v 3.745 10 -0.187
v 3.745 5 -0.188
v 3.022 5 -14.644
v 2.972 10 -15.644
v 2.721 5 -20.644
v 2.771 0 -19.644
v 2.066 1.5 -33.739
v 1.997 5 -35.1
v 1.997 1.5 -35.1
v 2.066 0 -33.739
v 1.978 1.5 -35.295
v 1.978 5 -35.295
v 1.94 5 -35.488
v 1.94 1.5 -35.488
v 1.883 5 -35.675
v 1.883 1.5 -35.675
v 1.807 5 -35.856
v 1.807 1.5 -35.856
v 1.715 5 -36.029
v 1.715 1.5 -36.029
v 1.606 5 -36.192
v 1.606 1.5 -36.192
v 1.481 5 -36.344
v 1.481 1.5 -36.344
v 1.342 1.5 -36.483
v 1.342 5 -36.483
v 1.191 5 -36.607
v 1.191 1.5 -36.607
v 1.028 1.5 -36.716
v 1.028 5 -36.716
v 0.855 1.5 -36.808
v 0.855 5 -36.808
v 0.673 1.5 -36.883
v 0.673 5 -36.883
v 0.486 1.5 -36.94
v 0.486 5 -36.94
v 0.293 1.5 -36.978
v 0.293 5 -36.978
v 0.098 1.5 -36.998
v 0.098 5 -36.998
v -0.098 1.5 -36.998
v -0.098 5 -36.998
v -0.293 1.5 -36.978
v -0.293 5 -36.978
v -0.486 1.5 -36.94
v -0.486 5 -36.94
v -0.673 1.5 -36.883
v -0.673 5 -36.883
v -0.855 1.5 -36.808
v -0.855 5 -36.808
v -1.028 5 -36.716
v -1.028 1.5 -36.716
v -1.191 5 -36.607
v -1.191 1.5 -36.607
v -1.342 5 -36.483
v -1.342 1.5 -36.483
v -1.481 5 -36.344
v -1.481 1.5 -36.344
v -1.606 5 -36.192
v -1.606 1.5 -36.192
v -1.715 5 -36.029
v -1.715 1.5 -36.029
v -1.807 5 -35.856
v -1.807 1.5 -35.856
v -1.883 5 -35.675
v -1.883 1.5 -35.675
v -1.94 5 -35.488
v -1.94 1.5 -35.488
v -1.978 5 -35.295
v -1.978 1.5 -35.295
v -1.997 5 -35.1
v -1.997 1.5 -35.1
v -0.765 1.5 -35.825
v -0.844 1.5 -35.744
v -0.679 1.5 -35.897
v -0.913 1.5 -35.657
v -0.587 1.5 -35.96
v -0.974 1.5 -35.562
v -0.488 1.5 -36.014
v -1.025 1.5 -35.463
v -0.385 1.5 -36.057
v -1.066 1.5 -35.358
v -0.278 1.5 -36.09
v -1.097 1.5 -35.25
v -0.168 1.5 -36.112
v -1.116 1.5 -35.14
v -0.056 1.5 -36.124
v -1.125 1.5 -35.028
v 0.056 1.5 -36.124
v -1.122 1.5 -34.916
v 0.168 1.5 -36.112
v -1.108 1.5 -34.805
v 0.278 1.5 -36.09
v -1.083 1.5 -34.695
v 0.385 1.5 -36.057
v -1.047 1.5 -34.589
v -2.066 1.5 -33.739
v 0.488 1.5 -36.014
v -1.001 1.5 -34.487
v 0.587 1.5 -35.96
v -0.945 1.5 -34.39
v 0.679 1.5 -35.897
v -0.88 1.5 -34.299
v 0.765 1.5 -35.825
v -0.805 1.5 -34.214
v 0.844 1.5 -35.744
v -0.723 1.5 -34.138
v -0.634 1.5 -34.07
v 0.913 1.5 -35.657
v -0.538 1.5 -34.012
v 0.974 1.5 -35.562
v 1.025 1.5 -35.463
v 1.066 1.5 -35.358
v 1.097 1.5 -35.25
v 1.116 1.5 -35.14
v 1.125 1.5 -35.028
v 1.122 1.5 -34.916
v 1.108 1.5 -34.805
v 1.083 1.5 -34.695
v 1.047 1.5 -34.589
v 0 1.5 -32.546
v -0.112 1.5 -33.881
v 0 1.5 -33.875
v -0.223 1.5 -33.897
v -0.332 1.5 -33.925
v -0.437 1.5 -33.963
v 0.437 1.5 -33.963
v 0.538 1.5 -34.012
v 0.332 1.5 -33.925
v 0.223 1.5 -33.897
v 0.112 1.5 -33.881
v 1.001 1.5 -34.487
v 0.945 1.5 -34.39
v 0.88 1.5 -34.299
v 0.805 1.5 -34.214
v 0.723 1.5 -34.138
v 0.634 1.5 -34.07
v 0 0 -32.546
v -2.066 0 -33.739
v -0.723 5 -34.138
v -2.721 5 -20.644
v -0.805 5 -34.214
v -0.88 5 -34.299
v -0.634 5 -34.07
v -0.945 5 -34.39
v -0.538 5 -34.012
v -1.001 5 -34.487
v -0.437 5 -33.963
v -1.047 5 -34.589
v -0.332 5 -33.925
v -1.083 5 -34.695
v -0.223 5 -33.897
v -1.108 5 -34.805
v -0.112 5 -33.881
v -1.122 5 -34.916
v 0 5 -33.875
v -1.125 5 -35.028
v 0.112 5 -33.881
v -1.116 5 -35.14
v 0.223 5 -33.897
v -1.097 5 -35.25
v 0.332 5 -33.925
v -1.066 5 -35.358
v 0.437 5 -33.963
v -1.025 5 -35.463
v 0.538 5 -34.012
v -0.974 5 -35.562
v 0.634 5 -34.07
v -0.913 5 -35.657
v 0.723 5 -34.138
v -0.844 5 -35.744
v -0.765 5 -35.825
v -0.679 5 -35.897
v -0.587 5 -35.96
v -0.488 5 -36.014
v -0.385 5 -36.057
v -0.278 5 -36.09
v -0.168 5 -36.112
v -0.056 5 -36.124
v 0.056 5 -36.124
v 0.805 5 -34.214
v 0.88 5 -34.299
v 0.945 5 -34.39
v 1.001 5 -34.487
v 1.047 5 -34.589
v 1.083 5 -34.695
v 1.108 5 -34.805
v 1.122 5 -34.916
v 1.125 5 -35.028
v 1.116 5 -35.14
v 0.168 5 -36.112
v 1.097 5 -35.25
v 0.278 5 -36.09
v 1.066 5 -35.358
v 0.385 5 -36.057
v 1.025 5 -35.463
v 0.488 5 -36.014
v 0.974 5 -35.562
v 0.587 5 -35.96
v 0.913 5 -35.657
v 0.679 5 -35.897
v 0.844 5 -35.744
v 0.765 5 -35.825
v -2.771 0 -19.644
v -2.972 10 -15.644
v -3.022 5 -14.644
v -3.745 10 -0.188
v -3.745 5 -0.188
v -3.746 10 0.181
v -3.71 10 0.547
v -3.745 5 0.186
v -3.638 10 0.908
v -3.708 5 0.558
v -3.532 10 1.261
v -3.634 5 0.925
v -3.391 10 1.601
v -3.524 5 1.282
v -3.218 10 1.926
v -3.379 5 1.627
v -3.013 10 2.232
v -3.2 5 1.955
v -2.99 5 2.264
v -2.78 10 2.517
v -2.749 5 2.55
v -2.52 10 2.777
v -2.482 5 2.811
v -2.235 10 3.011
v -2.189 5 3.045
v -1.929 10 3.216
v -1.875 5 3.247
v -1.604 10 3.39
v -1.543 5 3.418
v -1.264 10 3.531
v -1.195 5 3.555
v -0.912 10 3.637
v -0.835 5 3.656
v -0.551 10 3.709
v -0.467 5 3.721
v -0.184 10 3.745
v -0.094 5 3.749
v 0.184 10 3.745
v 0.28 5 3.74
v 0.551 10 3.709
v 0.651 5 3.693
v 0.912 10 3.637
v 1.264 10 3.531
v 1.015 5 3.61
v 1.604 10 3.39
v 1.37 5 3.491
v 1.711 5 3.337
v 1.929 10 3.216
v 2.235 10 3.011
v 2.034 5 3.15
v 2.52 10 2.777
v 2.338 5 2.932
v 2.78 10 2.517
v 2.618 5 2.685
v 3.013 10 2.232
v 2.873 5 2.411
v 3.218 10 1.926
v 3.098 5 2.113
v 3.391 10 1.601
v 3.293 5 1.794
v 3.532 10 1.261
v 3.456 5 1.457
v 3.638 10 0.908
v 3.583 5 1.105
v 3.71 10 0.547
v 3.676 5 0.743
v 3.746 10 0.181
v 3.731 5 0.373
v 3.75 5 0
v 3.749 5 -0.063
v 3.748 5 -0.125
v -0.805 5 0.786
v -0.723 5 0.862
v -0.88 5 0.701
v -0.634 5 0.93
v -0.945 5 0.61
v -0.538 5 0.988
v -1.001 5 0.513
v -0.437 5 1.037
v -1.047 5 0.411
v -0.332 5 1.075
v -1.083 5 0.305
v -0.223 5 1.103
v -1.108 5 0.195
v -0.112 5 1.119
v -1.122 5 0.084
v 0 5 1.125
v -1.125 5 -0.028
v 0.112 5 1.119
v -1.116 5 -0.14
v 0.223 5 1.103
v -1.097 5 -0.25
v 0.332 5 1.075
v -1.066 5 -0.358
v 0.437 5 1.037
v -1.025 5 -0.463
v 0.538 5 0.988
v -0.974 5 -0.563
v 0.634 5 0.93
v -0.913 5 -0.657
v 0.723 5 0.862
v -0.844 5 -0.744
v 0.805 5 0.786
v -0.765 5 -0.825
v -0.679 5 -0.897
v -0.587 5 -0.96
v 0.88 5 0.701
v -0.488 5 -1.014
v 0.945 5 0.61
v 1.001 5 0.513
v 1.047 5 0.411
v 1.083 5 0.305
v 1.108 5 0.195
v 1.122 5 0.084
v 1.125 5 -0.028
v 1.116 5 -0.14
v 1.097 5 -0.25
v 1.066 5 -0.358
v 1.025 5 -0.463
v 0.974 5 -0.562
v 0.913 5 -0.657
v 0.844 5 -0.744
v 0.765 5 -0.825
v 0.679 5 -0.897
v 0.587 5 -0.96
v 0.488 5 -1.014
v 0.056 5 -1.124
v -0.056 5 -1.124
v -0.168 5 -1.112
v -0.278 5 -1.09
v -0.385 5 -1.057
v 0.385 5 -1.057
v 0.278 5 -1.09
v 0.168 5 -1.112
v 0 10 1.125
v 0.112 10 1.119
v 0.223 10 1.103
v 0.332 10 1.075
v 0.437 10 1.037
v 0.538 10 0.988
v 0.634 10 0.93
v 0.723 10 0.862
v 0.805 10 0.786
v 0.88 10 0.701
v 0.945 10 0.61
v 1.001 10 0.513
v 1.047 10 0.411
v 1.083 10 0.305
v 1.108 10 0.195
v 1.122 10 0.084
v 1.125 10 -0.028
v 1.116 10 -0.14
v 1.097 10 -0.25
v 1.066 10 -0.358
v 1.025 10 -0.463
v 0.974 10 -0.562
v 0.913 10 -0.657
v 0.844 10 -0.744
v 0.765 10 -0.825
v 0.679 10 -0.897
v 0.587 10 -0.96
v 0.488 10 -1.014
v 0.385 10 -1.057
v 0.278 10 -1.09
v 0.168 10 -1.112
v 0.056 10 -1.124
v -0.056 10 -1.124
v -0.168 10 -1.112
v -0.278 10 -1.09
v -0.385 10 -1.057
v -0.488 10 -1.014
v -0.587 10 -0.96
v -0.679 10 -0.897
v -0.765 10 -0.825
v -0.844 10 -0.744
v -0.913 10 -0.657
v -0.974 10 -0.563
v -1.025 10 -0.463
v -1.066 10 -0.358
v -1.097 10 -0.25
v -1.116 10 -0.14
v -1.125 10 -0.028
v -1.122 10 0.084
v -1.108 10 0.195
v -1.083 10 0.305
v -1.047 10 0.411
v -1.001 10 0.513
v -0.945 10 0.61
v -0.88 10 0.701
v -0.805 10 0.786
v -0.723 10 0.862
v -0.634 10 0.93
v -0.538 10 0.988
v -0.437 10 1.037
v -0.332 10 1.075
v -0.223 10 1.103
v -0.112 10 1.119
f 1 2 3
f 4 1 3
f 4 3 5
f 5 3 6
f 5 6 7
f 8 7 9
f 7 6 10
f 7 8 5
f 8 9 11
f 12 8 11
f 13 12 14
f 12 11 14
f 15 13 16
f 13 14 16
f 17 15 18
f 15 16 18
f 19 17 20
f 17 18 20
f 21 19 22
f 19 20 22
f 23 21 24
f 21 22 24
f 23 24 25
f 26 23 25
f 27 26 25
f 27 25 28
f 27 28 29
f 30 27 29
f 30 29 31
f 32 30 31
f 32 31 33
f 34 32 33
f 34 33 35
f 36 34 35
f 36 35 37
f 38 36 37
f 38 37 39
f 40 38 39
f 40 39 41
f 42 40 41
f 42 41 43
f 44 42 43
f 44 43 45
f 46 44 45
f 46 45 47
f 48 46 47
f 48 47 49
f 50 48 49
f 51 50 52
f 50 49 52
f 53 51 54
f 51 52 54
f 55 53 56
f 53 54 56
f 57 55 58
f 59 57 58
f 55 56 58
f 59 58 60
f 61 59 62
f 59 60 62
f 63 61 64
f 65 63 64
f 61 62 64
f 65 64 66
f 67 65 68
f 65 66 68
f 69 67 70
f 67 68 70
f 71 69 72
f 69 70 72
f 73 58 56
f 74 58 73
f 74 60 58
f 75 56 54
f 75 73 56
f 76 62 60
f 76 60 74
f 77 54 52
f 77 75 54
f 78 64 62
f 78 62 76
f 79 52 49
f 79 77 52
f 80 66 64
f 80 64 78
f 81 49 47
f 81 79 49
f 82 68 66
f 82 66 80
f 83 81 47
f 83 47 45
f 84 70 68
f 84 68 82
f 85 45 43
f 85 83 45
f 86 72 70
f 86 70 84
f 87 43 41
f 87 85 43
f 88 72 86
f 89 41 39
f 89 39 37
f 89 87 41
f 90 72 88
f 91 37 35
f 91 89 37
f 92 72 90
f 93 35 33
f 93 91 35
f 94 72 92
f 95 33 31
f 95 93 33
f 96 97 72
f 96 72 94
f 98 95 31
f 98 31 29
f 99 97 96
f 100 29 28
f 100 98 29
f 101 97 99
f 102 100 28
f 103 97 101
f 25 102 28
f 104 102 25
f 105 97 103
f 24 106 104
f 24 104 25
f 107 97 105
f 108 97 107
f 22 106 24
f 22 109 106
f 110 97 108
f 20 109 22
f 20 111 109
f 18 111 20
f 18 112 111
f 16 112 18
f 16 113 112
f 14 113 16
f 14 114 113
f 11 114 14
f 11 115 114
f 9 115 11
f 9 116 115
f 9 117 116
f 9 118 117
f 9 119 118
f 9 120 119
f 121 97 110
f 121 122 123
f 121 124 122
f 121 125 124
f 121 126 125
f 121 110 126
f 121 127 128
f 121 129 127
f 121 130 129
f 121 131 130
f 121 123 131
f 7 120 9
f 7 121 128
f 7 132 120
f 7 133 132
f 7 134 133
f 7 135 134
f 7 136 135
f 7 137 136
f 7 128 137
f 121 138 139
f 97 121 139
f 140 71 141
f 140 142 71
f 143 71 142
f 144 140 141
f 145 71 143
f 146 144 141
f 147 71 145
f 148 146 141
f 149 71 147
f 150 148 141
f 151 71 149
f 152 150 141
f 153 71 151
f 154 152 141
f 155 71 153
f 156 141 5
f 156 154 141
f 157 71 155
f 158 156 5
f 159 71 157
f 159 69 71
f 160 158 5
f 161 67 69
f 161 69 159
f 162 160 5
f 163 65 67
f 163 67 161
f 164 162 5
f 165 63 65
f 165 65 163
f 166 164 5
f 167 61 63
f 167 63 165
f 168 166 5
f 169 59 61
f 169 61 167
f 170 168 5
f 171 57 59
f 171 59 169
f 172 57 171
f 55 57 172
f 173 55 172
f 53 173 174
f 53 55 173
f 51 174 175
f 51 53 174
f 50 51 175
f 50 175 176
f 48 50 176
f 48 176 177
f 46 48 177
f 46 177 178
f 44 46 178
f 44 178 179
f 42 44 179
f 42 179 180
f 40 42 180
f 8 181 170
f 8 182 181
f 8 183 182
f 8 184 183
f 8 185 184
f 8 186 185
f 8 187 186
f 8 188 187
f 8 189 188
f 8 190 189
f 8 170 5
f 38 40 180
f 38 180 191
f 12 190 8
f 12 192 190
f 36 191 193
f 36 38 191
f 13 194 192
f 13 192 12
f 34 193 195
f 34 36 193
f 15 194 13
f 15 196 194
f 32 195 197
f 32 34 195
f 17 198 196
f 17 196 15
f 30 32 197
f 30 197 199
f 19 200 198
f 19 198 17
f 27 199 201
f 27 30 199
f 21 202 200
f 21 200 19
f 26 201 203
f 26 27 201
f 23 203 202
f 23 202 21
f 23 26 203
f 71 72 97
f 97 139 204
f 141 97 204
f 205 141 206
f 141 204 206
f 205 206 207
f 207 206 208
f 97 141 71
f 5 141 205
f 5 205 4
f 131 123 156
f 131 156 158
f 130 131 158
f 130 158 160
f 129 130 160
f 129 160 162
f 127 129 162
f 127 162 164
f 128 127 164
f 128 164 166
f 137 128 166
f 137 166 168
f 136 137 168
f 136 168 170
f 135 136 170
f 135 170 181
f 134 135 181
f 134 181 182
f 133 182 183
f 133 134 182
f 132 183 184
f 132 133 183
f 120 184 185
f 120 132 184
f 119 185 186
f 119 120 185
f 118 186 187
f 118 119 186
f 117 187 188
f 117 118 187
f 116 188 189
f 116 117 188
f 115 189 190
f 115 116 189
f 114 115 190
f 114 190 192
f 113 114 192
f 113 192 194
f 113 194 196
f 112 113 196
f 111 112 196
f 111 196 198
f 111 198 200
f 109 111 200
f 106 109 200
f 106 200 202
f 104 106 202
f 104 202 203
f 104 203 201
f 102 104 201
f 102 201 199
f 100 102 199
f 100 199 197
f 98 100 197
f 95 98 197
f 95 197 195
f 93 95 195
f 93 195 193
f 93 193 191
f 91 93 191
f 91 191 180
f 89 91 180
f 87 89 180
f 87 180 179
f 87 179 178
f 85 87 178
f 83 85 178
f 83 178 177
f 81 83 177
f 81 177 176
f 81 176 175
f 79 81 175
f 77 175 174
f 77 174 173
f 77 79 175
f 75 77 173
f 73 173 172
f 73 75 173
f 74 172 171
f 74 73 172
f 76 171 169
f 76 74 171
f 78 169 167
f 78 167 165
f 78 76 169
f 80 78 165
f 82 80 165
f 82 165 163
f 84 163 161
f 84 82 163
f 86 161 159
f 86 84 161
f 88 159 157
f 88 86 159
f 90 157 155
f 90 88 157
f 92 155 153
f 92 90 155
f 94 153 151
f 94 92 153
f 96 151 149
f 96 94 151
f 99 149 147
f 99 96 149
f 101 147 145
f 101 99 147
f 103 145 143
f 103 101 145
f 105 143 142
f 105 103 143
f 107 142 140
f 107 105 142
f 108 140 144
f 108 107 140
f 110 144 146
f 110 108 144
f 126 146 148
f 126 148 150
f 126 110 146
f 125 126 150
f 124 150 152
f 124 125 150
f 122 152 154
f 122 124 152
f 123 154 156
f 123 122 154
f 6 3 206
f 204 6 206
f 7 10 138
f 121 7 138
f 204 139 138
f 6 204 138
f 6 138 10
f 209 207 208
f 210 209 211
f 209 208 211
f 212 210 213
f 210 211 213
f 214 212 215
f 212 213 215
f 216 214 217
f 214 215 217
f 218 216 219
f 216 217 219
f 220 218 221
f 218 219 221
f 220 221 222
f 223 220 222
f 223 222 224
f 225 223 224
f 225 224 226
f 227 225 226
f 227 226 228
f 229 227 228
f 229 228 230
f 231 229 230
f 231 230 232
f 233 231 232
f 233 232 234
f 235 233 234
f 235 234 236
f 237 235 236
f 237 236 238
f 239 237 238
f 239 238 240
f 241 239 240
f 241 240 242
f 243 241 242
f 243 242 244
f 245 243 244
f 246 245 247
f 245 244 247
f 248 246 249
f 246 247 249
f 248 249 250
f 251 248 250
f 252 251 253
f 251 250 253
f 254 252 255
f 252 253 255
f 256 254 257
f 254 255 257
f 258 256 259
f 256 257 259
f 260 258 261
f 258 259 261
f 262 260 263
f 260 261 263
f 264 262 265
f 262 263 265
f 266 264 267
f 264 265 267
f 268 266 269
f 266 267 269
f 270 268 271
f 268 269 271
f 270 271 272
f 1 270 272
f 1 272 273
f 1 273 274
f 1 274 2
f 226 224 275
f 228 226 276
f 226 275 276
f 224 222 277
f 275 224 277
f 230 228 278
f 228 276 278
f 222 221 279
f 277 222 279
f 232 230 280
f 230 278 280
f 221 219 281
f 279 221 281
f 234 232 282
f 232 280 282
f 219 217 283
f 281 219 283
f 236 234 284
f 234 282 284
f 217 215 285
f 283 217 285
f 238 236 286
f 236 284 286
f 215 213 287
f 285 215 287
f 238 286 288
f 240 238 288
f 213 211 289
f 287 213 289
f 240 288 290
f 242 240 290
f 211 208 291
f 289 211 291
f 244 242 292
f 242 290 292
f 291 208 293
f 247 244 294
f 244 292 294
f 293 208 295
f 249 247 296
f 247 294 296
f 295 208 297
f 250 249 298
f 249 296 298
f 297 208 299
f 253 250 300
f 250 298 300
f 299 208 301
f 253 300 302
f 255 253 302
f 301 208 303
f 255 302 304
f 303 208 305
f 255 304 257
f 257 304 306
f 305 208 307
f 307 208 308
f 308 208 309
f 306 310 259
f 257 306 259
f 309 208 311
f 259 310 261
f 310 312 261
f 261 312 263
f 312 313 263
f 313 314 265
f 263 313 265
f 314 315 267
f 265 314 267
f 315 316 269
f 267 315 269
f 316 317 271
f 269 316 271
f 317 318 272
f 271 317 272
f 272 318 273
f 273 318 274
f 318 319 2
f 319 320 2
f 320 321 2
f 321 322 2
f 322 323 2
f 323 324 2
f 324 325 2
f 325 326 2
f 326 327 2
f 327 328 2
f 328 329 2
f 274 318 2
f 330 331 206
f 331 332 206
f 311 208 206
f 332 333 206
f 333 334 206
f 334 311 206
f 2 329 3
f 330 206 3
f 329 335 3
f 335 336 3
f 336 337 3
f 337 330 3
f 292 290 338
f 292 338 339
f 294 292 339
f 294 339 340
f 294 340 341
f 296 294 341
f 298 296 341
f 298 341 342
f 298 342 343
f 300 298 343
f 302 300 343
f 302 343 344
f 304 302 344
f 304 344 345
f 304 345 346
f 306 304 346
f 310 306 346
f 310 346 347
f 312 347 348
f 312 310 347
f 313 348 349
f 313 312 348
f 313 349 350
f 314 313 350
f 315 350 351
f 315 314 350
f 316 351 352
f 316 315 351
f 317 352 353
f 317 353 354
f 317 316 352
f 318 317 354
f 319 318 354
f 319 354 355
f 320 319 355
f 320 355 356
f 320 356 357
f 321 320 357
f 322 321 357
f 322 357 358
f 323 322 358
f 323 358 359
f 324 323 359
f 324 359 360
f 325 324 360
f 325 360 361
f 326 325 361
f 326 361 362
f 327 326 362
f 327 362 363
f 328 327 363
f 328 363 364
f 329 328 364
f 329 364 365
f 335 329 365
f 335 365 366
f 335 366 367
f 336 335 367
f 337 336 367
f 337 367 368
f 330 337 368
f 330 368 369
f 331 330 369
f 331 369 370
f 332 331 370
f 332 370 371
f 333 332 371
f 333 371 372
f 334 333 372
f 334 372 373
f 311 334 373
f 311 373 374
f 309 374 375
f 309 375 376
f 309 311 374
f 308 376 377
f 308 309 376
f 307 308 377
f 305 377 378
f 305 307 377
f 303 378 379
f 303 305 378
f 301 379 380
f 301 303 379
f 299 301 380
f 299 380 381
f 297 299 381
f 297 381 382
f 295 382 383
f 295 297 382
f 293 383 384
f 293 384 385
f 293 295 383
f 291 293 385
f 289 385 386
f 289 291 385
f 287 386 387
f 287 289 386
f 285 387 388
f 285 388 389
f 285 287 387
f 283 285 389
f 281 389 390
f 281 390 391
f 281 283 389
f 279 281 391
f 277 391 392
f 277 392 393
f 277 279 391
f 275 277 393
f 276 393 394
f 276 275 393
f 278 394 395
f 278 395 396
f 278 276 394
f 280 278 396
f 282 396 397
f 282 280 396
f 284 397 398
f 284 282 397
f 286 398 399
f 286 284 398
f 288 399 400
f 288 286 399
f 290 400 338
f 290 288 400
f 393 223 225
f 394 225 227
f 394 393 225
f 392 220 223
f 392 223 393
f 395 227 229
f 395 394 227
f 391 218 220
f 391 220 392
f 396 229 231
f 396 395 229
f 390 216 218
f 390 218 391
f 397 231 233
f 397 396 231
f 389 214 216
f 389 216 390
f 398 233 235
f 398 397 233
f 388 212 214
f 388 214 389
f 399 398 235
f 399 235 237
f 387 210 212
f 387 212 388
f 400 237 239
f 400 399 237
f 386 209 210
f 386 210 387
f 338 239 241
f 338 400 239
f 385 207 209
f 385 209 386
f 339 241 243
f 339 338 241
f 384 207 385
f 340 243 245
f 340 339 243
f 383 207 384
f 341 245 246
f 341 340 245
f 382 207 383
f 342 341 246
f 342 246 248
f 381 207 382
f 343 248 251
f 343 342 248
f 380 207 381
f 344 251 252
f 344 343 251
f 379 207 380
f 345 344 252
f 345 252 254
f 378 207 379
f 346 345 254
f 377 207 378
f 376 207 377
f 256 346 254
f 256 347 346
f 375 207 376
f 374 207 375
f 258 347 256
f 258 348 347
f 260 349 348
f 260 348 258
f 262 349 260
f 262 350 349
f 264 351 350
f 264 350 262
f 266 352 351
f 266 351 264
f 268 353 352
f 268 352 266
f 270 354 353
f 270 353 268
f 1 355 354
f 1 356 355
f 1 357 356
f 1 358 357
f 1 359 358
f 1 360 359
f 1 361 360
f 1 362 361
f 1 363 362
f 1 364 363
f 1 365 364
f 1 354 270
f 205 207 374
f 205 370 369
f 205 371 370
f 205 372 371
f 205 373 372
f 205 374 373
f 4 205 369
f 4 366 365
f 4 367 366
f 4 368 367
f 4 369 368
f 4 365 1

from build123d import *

# Parameters (mm, degrees)
SKETCH1_R           = 1.125
BOSS_EXTRUDE1_DEPTH = 10
CUT_EXTRUDE1_START  = -5
SKETCH2_R           = 1.125
CUT_EXTRUDE1_DEPTH  = 5
CUT_EXTRUDE3_START  = -10
SKETCH2_4_R         = 1.125
CUT_EXTRUDE3_DEPTH  = 5
CHAMFER1_SIZE       = 5
CUT_EXTRUDE4_DEPTH  = 1.5


with BuildPart() as part:
    # Sketch1 → Boss-Extrude1 (new body)
    with BuildSketch(Plane(origin=(0, 0, 0), x_dir=(1, 0, 0), z_dir=(0, 1, 0))):
        with BuildLine():
            ThreePointArc((-3.745309567, 0.1875), (0, -3.75), (3.745309567, 0.1875))
            Line((3.745309567, 0.1875), (1.997498436, 35.1))
            ThreePointArc((1.997498436, 35.1), (0, 37), (-1.997498436, 35.1))
            Line((-1.997498436, 35.1), (-3.745309567, 0.1875))
        make_face()
        with Locations(Location((0, 0, 0), (0, 0, 270))):
            Circle(SKETCH1_R, mode=Mode.SUBTRACT)
        with Locations(Location((0, 35, 0), (0, 0, 270))):
            Circle(SKETCH1_R, mode=Mode.SUBTRACT)
    extrude(amount=BOSS_EXTRUDE1_DEPTH)

    # Sketch2 → Cut-Extrude1 (cut)
    with BuildSketch(Plane(origin=(0, 10, 0), x_dir=(1, 0, 0), z_dir=(0, 1, 0)).offset(CUT_EXTRUDE1_START)):
        with BuildLine():
            Line((-1.997498436, 35.1), (-2.721216149, 20.64375))
            Line((-2.721216149, 20.64375), (2.721216149, 20.64375))
            Line((2.721216149, 20.64375), (1.997498436, 35.1))
            ThreePointArc((1.997498436, 35.1), (0, 37), (-1.997498436, 35.1))
        make_face()
        with Locations(Location((0, 35, 0), (0, 0, 270))):
            Circle(SKETCH2_R, mode=Mode.SUBTRACT)
    extrude(amount=CUT_EXTRUDE1_DEPTH, mode=Mode.SUBTRACT)

    # Sketch2<4> → Cut-Extrude3 (cut)
    # profile 1 of 2: a face of its own
    with BuildSketch(Plane(origin=(0, 10, 0), x_dir=(1, 0, 0), z_dir=(0, 1, 0)).offset(CUT_EXTRUDE3_START)):
        with BuildLine():
            ThreePointArc((3.745309567, 0.1875), (0, 3.75), (-3.745309567, 0.1875))
            ThreePointArc((-3.745309567, 0.1875), (-0.093779329, -3.748827208), (3.75, 0))
            ThreePointArc((3.75, 0), (3.748827208, 0.093779329), (3.745309567, 0.1875))
        make_face()
        with Locations(Location((0, 0, 0), (0, 0, 270))):
            Circle(SKETCH2_4_R, mode=Mode.SUBTRACT)
    # profile 2 of 2: a face of its own
    with BuildSketch(Plane(origin=(0, 10, 0), x_dir=(1, 0, 0), z_dir=(0, 1, 0)).offset(CUT_EXTRUDE3_START)):
        with BuildLine():
            Line((3.021591853, 14.64375), (-3.021591853, 14.64375))
            Line((-3.021591853, 14.64375), (-3.745309567, 0.1875))
            ThreePointArc((-3.745309567, 0.1875), (0, 3.75), (3.745309567, 0.1875))
            Line((3.745309567, 0.1875), (3.021591853, 14.64375))
        make_face()
    extrude(amount=CUT_EXTRUDE3_DEPTH, mode=Mode.SUBTRACT)

    # Chamfer1
    chamfer1_edges = [part.edges().sort_by_distance(p)[0] for p in [
        (0, 0, -14.64375),
        (0, 10, -20.64375),
    ]]
    chamfer(chamfer1_edges, length=CHAMFER1_SIZE - 0.0001)  # a hair under: the kernel refuses the full size

    # Sketch3 → Cut-Extrude4 (cut)
    with BuildSketch(Plane.XZ):
        Polygon((0, -32.546261356), (-2.125, -33.773130678), (-2.125, -36.226869322), (0, -37.453738644), (2.125, -36.226869322), (2.125, -33.773130678), align=None)
    extrude(amount=-CUT_EXTRUDE4_DEPTH, mode=Mode.SUBTRACT)


solid = part.part
